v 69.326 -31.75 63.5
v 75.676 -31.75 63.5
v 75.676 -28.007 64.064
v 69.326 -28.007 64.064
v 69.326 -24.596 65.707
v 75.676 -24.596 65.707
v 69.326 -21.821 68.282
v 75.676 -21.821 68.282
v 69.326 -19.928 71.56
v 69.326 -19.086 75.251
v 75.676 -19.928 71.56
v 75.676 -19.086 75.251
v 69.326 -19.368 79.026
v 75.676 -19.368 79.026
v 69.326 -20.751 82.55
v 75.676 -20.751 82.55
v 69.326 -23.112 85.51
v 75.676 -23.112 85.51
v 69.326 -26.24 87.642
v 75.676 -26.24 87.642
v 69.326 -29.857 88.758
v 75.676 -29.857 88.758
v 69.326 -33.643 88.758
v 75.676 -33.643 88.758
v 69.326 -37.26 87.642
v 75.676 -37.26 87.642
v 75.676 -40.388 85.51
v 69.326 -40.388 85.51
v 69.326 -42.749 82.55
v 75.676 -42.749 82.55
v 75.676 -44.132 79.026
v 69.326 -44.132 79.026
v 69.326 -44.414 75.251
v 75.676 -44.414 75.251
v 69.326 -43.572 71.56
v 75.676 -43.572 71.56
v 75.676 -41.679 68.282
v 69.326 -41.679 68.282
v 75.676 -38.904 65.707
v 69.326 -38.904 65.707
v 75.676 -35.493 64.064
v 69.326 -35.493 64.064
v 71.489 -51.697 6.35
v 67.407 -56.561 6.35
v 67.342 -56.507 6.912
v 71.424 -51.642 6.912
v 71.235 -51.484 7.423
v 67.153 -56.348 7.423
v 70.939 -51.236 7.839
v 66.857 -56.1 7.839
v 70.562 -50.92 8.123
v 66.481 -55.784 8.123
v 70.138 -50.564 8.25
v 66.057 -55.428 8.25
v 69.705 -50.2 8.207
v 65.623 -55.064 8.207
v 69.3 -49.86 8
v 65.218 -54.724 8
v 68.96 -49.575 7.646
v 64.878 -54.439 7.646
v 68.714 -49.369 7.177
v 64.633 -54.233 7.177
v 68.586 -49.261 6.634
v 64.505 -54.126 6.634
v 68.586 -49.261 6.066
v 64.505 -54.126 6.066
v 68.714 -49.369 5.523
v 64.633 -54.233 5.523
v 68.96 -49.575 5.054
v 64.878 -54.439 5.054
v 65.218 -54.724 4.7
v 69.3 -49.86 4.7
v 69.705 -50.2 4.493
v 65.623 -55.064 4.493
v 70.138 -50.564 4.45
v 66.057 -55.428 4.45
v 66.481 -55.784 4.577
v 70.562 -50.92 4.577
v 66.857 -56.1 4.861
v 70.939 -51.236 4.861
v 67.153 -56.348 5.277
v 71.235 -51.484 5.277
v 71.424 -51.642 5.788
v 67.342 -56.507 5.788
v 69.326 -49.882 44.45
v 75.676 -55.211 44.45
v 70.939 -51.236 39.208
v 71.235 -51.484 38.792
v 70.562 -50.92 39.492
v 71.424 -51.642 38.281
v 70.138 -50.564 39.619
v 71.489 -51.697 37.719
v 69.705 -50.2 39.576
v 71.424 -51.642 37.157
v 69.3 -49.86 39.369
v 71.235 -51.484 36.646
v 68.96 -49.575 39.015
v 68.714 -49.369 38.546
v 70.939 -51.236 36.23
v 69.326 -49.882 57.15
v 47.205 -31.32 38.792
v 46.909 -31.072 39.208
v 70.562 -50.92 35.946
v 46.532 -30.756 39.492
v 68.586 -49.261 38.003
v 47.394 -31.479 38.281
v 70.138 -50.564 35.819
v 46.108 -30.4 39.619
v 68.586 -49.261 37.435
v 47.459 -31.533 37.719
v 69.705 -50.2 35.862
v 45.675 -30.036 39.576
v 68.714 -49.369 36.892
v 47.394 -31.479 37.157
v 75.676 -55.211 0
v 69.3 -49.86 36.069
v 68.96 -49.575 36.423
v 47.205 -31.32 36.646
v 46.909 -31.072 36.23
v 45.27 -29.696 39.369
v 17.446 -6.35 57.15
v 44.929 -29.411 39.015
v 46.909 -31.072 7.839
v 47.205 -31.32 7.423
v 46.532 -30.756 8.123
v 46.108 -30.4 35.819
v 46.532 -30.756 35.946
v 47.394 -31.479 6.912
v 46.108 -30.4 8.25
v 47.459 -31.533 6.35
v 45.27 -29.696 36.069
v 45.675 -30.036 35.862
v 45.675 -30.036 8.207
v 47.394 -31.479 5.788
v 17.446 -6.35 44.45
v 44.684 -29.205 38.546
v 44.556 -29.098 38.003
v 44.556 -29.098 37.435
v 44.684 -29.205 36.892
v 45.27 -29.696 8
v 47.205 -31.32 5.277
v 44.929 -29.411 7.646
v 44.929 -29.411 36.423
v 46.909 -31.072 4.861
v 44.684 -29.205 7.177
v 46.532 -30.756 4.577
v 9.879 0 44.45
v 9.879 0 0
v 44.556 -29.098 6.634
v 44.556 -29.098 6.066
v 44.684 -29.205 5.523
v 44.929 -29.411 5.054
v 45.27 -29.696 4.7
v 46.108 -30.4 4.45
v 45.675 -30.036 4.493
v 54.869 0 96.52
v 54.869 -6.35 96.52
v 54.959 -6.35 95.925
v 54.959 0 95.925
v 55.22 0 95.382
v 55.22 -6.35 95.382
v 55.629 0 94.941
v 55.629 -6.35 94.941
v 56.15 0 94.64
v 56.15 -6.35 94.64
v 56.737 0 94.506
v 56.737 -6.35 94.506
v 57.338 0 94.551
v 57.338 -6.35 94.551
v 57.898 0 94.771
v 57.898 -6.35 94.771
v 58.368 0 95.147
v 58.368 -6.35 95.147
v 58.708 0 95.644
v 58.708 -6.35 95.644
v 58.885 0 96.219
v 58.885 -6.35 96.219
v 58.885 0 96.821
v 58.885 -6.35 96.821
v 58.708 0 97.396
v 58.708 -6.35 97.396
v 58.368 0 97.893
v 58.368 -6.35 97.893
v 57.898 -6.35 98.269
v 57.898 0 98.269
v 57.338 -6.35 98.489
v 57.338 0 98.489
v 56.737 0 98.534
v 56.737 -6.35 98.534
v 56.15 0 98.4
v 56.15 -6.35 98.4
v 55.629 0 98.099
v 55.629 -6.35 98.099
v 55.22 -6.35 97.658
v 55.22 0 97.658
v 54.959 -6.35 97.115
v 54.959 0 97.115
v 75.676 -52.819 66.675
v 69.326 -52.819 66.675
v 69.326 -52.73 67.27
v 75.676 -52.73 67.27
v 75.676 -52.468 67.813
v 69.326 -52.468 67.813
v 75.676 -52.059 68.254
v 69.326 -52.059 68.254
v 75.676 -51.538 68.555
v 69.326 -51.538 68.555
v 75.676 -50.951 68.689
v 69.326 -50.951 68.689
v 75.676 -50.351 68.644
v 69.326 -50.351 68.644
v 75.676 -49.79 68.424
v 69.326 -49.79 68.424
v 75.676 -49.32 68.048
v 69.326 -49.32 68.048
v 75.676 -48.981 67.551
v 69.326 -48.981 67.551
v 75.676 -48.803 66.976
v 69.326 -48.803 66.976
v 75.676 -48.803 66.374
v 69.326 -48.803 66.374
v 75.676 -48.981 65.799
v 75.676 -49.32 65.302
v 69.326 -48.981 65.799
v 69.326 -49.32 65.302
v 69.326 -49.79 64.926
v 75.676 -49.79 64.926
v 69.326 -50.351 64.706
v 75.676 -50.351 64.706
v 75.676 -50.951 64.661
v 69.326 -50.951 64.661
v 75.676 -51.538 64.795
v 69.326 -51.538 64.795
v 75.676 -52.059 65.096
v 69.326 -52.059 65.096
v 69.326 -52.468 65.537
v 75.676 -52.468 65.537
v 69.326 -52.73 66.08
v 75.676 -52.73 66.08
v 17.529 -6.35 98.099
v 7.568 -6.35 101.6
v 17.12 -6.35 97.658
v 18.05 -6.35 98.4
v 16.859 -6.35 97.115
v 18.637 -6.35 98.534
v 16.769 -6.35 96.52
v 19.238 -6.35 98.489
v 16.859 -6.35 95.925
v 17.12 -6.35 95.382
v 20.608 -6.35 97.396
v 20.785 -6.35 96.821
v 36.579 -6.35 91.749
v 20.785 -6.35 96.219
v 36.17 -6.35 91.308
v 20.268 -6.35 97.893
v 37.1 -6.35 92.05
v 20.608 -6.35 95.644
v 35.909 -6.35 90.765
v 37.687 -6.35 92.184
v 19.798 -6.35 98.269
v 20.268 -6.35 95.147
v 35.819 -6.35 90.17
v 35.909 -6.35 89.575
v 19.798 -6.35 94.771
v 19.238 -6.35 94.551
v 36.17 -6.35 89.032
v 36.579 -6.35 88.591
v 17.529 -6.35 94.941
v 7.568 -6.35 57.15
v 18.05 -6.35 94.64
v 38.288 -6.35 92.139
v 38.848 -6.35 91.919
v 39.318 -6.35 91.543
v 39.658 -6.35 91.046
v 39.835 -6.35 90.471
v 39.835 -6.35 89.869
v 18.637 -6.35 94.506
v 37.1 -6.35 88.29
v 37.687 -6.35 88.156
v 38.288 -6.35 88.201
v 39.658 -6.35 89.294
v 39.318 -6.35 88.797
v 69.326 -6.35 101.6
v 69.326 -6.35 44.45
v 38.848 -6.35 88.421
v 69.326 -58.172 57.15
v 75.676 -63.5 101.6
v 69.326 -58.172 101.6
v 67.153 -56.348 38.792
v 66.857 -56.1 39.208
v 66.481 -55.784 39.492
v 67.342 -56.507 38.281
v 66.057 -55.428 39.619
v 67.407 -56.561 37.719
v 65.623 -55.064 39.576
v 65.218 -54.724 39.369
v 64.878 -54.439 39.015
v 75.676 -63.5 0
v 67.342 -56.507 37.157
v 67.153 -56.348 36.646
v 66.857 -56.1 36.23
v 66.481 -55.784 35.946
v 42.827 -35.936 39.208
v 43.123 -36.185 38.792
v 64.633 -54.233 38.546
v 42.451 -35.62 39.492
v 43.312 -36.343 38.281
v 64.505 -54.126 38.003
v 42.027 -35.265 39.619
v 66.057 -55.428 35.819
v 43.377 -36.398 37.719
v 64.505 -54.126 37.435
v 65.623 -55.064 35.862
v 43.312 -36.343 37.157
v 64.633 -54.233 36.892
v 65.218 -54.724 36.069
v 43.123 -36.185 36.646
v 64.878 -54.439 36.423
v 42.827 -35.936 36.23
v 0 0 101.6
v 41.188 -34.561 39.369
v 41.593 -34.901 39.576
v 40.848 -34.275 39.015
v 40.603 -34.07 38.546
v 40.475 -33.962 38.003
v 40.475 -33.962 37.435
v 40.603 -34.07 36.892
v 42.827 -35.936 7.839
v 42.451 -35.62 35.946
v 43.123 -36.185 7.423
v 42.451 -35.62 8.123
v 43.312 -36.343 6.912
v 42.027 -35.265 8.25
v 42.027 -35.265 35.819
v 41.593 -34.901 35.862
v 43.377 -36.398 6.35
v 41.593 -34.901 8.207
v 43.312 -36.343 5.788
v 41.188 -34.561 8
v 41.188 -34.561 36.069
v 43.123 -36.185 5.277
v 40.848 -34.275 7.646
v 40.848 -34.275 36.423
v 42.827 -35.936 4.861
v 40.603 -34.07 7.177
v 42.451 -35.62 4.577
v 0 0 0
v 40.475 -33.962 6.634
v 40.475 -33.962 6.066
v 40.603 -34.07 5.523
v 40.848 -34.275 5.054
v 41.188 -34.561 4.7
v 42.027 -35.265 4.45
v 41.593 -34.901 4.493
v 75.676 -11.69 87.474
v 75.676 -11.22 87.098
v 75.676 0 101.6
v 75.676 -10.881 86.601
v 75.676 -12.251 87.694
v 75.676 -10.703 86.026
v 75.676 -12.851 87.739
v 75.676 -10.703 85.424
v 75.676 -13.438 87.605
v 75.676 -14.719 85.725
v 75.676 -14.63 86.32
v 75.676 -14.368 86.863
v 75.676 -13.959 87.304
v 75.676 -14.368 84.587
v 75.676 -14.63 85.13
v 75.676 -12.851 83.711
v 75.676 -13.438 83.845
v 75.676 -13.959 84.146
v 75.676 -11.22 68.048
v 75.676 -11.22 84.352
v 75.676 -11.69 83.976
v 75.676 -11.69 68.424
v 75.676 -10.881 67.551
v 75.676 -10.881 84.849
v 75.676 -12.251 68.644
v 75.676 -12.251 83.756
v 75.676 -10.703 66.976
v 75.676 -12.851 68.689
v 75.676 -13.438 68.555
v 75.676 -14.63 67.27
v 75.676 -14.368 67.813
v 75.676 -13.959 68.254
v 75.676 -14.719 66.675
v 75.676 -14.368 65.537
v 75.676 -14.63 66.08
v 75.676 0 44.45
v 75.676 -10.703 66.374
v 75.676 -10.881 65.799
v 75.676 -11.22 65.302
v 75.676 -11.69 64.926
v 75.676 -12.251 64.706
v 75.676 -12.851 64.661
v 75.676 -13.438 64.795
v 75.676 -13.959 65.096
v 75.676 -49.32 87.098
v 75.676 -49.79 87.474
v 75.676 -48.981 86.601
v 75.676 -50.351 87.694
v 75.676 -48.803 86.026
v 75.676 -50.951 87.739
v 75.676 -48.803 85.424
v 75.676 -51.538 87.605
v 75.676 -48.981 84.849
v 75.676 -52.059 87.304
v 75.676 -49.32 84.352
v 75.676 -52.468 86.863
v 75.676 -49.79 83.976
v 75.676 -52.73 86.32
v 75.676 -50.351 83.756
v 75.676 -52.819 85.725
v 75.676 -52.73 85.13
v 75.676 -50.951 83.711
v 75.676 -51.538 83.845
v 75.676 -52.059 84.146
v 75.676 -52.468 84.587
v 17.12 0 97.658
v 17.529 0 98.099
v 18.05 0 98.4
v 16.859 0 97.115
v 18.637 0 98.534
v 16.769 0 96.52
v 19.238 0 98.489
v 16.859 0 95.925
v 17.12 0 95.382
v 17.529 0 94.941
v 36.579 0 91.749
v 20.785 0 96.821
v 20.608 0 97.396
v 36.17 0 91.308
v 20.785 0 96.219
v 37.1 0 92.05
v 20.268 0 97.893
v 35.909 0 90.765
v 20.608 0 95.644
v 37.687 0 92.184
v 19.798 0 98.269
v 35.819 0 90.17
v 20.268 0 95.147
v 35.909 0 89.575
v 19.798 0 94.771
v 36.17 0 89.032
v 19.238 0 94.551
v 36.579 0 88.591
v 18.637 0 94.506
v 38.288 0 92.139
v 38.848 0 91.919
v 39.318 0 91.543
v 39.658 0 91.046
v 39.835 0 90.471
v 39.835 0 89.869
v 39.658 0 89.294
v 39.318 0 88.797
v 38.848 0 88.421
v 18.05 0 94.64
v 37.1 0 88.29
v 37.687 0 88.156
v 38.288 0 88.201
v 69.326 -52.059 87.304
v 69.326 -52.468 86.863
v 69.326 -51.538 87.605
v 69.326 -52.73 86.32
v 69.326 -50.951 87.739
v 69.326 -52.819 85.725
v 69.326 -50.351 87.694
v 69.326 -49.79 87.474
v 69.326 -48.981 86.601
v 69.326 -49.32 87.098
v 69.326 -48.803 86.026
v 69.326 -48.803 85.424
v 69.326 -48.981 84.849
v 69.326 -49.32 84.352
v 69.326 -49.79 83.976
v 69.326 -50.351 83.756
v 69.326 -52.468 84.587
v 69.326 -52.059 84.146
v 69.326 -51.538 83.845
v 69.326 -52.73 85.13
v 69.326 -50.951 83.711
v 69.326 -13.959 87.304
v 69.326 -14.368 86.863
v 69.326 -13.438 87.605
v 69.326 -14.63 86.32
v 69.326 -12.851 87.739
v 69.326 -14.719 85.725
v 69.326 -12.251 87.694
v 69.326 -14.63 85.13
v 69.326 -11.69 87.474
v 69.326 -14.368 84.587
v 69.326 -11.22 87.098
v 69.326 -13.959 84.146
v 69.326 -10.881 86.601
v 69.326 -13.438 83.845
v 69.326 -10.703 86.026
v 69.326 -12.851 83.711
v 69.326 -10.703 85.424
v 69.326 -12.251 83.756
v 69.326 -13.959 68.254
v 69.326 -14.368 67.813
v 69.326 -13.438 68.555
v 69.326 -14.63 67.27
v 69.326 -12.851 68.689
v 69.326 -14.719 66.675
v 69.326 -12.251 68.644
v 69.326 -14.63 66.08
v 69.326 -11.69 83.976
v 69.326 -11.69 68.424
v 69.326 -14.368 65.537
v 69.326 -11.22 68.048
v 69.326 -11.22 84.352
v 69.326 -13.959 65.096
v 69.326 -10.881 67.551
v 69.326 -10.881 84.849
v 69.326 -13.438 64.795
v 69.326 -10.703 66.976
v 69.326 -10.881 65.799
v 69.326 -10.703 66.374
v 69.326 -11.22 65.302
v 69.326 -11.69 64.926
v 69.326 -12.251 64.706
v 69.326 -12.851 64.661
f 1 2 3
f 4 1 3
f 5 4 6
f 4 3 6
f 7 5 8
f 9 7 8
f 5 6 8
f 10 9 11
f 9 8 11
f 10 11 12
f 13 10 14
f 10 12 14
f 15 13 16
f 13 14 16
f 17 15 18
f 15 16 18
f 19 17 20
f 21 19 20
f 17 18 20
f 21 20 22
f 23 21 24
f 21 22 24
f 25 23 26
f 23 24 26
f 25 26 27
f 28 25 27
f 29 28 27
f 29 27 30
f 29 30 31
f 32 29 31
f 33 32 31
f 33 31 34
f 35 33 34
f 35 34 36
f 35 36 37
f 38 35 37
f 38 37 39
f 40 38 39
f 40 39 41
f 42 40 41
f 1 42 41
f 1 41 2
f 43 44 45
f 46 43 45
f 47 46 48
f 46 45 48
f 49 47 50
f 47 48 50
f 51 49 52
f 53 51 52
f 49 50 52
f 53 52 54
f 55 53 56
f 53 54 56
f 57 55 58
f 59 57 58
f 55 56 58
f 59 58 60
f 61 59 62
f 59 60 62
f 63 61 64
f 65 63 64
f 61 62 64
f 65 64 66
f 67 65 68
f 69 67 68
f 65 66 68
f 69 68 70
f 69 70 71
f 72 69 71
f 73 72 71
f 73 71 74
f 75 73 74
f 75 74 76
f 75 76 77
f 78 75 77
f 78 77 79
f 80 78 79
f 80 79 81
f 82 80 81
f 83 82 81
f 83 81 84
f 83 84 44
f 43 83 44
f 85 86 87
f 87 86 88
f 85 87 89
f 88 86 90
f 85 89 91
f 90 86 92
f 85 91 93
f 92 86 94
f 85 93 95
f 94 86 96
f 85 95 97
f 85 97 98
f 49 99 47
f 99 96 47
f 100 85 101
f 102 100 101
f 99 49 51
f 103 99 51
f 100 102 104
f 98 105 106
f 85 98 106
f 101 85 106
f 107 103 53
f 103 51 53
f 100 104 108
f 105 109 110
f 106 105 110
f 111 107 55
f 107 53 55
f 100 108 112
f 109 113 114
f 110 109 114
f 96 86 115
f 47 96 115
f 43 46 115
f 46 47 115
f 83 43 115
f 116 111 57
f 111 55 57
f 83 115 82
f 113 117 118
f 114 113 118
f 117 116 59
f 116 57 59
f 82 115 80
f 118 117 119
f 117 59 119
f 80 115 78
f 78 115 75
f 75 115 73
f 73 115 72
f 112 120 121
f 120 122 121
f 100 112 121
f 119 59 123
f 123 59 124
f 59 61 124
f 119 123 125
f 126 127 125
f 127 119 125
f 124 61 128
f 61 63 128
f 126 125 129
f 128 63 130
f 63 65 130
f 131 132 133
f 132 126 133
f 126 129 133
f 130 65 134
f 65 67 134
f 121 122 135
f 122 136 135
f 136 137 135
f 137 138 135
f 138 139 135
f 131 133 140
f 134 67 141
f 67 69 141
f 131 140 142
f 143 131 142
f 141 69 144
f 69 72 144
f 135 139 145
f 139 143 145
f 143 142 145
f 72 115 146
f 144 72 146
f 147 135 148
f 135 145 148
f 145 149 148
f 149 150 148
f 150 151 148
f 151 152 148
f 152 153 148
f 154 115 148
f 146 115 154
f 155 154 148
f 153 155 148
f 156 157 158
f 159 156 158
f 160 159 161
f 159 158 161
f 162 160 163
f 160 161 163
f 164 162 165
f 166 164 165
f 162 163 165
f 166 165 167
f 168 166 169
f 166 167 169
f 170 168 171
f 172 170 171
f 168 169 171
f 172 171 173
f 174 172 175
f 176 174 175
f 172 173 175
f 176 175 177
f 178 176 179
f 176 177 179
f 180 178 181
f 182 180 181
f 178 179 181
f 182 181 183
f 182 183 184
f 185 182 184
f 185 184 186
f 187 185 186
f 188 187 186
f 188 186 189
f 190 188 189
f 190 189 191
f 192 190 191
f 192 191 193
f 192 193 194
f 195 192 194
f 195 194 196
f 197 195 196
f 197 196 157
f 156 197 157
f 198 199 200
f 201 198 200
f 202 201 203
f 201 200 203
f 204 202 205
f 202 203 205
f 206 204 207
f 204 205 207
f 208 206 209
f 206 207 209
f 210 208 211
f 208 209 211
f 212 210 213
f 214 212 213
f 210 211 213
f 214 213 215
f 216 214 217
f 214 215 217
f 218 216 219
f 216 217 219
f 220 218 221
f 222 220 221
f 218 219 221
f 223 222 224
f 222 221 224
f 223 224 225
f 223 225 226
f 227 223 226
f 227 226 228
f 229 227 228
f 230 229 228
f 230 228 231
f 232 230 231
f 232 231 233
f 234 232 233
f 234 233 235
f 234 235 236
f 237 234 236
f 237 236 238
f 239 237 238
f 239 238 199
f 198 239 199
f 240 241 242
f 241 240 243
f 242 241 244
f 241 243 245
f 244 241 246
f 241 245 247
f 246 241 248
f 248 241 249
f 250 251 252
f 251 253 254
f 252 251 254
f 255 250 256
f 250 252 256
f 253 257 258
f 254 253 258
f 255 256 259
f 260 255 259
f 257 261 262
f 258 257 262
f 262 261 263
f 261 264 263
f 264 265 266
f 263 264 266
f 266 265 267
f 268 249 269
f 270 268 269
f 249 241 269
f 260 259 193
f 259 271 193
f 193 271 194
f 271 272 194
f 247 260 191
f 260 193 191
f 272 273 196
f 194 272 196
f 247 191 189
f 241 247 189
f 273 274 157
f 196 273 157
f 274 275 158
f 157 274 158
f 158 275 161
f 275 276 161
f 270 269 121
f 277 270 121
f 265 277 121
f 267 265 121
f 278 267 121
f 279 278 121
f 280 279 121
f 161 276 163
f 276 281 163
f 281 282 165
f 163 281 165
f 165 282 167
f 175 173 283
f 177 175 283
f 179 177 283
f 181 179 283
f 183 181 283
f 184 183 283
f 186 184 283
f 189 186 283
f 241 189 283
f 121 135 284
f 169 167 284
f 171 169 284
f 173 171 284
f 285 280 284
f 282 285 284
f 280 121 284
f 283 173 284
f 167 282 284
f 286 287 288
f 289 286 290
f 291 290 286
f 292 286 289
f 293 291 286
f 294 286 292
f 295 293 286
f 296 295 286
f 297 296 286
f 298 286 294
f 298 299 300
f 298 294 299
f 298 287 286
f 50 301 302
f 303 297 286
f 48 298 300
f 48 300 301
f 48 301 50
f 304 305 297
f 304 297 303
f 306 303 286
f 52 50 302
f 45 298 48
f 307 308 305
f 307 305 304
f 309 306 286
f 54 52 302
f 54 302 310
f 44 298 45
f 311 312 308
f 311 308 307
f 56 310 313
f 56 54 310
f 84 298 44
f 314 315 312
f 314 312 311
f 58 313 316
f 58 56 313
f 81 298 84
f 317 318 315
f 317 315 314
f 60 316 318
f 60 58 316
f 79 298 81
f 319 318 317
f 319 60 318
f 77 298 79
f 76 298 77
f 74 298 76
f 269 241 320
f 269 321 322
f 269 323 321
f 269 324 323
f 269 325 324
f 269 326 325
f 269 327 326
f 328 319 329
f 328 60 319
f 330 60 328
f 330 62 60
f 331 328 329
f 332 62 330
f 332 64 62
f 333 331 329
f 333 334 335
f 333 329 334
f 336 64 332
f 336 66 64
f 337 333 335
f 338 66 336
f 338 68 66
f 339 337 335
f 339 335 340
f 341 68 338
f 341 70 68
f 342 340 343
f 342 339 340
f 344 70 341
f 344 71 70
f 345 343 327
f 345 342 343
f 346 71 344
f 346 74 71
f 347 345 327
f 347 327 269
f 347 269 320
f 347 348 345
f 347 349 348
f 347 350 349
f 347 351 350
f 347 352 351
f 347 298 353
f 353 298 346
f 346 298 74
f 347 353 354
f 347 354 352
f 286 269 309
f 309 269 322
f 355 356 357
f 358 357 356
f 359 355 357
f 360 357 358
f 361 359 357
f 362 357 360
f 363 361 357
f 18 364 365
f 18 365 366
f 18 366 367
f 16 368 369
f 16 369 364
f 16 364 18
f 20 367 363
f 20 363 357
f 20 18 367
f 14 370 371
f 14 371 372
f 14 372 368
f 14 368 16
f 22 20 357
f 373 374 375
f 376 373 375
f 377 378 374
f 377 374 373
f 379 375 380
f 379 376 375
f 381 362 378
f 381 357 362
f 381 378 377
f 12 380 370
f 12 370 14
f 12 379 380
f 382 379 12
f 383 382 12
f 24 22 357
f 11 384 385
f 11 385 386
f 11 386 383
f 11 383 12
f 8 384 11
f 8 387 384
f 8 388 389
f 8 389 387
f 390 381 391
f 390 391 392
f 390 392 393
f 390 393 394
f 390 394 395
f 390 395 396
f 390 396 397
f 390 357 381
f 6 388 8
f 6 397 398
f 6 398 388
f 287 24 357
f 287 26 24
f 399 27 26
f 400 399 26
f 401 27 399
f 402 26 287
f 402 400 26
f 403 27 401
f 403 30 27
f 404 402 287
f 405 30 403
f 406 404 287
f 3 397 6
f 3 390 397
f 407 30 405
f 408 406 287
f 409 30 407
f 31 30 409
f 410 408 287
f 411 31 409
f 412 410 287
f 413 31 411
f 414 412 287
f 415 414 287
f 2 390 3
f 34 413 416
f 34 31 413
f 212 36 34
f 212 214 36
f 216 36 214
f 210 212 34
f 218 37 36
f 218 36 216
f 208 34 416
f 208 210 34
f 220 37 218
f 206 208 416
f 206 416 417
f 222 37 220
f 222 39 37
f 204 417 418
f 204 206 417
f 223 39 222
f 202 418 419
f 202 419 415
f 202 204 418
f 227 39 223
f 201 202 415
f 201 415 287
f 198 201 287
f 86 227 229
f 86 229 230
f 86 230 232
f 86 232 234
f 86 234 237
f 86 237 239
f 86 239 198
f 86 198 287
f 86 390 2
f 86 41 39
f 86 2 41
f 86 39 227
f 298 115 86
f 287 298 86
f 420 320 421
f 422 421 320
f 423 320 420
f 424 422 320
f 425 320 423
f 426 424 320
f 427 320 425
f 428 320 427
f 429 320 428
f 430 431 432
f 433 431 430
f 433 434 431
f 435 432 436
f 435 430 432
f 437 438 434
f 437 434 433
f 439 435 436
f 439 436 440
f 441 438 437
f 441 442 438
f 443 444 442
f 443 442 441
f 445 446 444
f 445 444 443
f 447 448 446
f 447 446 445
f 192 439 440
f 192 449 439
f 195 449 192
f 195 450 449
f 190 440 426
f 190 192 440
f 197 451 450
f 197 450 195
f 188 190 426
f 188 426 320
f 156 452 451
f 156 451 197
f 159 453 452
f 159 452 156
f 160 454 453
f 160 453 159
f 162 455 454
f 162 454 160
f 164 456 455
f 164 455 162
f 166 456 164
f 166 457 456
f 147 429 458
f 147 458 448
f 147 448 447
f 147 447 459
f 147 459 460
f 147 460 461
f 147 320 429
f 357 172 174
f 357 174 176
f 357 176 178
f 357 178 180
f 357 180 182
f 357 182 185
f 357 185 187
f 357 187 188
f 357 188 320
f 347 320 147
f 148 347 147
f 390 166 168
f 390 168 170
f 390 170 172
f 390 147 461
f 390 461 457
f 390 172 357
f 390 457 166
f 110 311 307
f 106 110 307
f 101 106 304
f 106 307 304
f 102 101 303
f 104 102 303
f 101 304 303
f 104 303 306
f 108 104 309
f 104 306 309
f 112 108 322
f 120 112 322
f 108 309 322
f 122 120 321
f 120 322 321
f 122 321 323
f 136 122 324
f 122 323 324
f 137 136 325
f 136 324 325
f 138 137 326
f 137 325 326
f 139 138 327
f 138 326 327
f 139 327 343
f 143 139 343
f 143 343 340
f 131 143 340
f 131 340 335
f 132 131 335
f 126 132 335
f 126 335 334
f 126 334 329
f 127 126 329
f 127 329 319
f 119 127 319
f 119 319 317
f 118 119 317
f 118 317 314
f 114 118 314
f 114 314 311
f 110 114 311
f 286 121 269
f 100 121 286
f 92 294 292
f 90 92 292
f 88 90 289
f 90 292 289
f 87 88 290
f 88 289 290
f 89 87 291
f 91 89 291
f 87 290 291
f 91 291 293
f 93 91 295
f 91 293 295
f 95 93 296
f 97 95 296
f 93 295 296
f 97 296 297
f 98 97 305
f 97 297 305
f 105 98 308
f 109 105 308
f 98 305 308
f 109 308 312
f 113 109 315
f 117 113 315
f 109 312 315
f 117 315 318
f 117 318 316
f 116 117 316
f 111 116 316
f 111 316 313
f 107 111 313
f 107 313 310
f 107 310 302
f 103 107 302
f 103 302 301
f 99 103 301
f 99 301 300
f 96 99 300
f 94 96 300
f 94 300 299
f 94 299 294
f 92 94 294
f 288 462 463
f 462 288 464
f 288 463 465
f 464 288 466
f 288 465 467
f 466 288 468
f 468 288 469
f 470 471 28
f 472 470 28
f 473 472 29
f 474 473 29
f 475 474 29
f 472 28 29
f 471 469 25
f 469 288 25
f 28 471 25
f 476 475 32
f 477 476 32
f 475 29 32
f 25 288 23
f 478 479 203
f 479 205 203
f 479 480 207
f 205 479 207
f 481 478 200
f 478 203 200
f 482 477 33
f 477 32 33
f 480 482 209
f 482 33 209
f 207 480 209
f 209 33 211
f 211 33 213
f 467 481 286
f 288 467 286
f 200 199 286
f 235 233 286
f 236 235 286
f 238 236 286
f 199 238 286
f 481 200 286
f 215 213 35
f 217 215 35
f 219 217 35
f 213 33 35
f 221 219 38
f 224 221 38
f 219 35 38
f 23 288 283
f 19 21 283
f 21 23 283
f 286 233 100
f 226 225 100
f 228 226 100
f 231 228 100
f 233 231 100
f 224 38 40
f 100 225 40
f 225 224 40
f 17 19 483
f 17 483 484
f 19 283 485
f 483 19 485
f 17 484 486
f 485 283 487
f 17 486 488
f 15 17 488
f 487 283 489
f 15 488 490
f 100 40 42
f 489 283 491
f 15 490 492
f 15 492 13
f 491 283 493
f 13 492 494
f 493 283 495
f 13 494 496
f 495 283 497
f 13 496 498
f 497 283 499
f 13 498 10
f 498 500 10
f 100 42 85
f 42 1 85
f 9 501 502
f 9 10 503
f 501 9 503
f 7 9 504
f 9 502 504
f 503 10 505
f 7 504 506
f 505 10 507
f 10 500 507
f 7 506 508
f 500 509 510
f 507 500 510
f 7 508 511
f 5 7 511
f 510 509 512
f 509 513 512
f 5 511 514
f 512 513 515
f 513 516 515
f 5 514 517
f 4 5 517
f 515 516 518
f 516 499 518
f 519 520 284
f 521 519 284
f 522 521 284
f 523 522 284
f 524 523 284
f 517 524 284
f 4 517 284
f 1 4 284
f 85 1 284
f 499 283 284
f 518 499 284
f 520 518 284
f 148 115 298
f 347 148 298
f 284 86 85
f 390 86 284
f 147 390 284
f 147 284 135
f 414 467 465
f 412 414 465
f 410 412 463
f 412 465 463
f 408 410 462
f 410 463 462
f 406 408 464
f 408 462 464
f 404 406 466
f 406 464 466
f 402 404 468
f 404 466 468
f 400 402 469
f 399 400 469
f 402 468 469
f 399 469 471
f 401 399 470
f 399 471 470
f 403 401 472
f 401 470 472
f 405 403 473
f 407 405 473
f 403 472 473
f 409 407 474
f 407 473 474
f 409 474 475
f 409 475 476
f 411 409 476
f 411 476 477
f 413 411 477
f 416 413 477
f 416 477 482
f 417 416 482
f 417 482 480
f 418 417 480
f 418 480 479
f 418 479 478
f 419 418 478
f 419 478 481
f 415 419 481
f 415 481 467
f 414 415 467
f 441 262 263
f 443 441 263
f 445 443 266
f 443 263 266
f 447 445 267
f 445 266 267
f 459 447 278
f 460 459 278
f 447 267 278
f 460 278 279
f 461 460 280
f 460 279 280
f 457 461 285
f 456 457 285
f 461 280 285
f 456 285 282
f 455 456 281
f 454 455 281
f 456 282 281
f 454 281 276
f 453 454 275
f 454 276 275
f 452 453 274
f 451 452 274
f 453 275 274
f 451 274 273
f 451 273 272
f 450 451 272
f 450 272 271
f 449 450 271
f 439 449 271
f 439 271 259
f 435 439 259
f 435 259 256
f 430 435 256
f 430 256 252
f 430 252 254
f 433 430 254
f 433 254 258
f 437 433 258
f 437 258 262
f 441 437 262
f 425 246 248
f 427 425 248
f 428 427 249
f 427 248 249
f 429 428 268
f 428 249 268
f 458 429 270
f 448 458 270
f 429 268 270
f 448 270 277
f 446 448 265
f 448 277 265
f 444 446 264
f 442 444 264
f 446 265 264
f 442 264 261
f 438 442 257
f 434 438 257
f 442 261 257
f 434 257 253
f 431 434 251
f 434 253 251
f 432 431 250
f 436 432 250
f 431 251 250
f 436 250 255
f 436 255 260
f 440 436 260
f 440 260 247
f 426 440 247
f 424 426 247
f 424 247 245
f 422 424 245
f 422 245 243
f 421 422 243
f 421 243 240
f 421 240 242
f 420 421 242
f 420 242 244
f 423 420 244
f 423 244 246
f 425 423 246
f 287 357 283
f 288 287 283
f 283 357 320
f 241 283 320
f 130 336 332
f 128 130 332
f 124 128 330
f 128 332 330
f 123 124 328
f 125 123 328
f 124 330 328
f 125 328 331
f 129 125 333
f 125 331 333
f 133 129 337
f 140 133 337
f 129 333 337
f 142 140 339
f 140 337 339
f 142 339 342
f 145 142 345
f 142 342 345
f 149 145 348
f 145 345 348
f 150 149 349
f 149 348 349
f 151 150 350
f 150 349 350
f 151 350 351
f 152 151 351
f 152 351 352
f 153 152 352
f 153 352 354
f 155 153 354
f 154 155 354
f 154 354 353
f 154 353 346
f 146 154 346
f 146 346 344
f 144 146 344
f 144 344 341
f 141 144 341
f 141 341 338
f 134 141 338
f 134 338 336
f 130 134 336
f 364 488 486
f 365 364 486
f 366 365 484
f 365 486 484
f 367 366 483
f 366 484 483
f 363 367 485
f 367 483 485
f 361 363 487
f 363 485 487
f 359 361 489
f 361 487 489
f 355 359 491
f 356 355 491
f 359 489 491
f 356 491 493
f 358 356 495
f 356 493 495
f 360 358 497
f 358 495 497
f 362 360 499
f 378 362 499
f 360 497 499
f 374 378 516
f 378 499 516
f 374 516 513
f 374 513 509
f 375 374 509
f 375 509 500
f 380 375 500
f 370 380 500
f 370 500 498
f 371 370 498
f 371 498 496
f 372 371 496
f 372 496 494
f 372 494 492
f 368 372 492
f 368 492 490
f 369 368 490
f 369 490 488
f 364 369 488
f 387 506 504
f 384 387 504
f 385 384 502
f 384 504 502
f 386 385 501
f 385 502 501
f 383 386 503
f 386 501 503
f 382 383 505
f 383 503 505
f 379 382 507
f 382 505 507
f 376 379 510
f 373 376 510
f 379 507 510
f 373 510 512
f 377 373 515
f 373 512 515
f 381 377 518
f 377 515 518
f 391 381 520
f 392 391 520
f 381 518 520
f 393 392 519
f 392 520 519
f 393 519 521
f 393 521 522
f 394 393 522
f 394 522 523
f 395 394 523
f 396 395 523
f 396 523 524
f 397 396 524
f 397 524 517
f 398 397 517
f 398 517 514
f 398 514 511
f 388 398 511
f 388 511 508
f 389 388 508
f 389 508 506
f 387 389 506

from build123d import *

# Parameters (mm, degrees)
BOSS_EXTRUDE1_DEPTH        = 101.6
CUT_EXTRUDE2_START         = -6.35
SKETCH3_W                  = 69.32635313
SKETCH3_H                  = 44.45
CUT_EXTRUDE2_DEPTH         = 58.15
CUT_EXTRUDE3_REACH         = 77.676
SKETCH4_R                  = 12.7
F_10_32_TAPPED_HOLE1_D     = 4.0386
F_10_32_TAPPED_HOLE1_DEPTH = 6.35
F_10_32_TAPPED_HOLE2_D     = 4.0386
F_10_32_TAPPED_HOLE2_DEPTH = 6.35
CUT_EXTRUDE4_DEPTH         = 44.45
CUT_EXTRUDE5_REACH         = 50.644
SKETCH11_R                 = 1.905


with BuildPart() as part:
    # Sketch1 → Boss-Extrude1 (new body)
    with BuildSketch(Plane.XY):
        Polygon((0, 0), (75.67635313, 0), (75.67635313, -63.5), align=None)
        Polygon((17.446481614, -6.35), (69.32635313, -6.35), (69.32635313, -49.882381055), align=None, mode=Mode.SUBTRACT)
    extrude(amount=BOSS_EXTRUDE1_DEPTH)

    # Sketch3 → Cut-Extrude2 (cut, through all)
    with BuildSketch(Plane(origin=(0, 0, 0), x_dir=(1, 0, 0), z_dir=(0, 1, 0)).offset(CUT_EXTRUDE2_START)):
        with Locations((34.663176565, -79.375)):
            Rectangle(SKETCH3_W, SKETCH3_H)
    extrude(amount=-CUT_EXTRUDE2_DEPTH, mode=Mode.SUBTRACT)

    # Sketch4 → Cut-Extrude3 (cut, up to next)
    with BuildSketch(Plane(origin=(75.67635313, 0, 0), x_dir=(0, 0, -1), z_dir=(1, 0, 0)), mode=Mode.PRIVATE) as cut_extrude3_sk1:
        with Locations((-76.2, -31.75)):
            Circle(SKETCH4_R)
    cut_extrude3_tool1 = extrude(cut_extrude3_sk1.sketch, amount=-CUT_EXTRUDE3_REACH, mode=Mode.PRIVATE) & part.part
    add(cut_extrude3_tool1.solids().sort_by_distance((75.676353, -31.75, 76.2))[0], mode=Mode.SUBTRACT)

    # #10-32 Tapped Hole1
    with Locations(Plane(origin=(75.67635313, -50.8, 85.725), x_dir=(0, 1, 0), z_dir=(1, 0, 0))):
        with Locations((0, 0), (0, -19.05), (38.1, 0), (38.1, -19.05)):
            Hole(F_10_32_TAPPED_HOLE1_D / 2, depth=F_10_32_TAPPED_HOLE1_DEPTH)

    # #10-32 Tapped Hole2
    with Locations(Plane(origin=(0, 0, 0), x_dir=(1, 0, 0), z_dir=(0, 1, 0))):
        with Locations((56.888176565, -96.52), (37.838176565, -90.17), (18.788176565, -96.52)):
            Hole(F_10_32_TAPPED_HOLE2_D / 2, depth=F_10_32_TAPPED_HOLE2_DEPTH)

    # Sketch10 → Cut-Extrude4 (cut)
    with BuildSketch(Plane(origin=(0, 0, 0), x_dir=(-1, 0, 0), z_dir=(0, 0, -1))):
        Polygon((-75.67635313, -55.210663713), (-9.878846301, 0), (-75.67635313, 0), align=None)
    extrude(amount=-CUT_EXTRUDE4_DEPTH, mode=Mode.SUBTRACT)

    # Sketch11 → Cut-Extrude5 (cut, up to next)
    with BuildSketch(Plane(origin=(0, 0, 0), x_dir=(0.766044443, -0.64278761, 0), z_dir=(-0.64278761, -0.766044443, 0)), mode=Mode.PRIVATE) as cut_extrude5_sk1:
        with Locations((54.719463006, 37.719)):
            Circle(SKETCH11_R)
    cut_extrude5_tool1 = extrude(cut_extrude5_sk1.sketch, amount=-CUT_EXTRUDE5_REACH, mode=Mode.PRIVATE) & part.part
    add(cut_extrude5_tool1.solids().sort_by_distance((41.917541, -35.172993, 37.719))[0], mode=Mode.SUBTRACT)
    # Sketch11 → Cut-Extrude5 (cut, up to next)
    with BuildSketch(Plane(origin=(0, 0, 0), x_dir=(0.766044443, -0.64278761, 0), z_dir=(-0.64278761, -0.766044443, 0)), mode=Mode.PRIVATE) as cut_extrude5_sk2:
        with Locations((86.088463006, 37.719)):
            Circle(SKETCH11_R)
    cut_extrude5_tool2 = extrude(cut_extrude5_sk2.sketch, amount=-CUT_EXTRUDE5_REACH, mode=Mode.PRIVATE) & part.part
    add(cut_extrude5_tool2.solids().sort_by_distance((65.947589, -55.336597, 37.719))[0], mode=Mode.SUBTRACT)
    # Sketch11 → Cut-Extrude5 (cut, up to next)
    with BuildSketch(Plane(origin=(0, 0, 0), x_dir=(0.766044443, -0.64278761, 0), z_dir=(-0.64278761, -0.766044443, 0)), mode=Mode.PRIVATE) as cut_extrude5_sk3:
        with Locations((54.719463006, 6.35)):
            Circle(SKETCH11_R)
    cut_extrude5_tool3 = extrude(cut_extrude5_sk3.sketch, amount=-CUT_EXTRUDE5_REACH, mode=Mode.PRIVATE) & part.part
    add(cut_extrude5_tool3.solids().sort_by_distance((41.917541, -35.172993, 6.35))[0], mode=Mode.SUBTRACT)
    # Sketch11 → Cut-Extrude5 (cut, up to next)
    with BuildSketch(Plane(origin=(0, 0, 0), x_dir=(0.766044443, -0.64278761, 0), z_dir=(-0.64278761, -0.766044443, 0)), mode=Mode.PRIVATE) as cut_extrude5_sk4:
        with Locations((86.088463006, 6.35)):
            Circle(SKETCH11_R)
    cut_extrude5_tool4 = extrude(cut_extrude5_sk4.sketch, amount=-CUT_EXTRUDE5_REACH, mode=Mode.PRIVATE) & part.part
    add(cut_extrude5_tool4.solids().sort_by_distance((65.947589, -55.336597, 6.35))[0], mode=Mode.SUBTRACT)


solid = part.part
